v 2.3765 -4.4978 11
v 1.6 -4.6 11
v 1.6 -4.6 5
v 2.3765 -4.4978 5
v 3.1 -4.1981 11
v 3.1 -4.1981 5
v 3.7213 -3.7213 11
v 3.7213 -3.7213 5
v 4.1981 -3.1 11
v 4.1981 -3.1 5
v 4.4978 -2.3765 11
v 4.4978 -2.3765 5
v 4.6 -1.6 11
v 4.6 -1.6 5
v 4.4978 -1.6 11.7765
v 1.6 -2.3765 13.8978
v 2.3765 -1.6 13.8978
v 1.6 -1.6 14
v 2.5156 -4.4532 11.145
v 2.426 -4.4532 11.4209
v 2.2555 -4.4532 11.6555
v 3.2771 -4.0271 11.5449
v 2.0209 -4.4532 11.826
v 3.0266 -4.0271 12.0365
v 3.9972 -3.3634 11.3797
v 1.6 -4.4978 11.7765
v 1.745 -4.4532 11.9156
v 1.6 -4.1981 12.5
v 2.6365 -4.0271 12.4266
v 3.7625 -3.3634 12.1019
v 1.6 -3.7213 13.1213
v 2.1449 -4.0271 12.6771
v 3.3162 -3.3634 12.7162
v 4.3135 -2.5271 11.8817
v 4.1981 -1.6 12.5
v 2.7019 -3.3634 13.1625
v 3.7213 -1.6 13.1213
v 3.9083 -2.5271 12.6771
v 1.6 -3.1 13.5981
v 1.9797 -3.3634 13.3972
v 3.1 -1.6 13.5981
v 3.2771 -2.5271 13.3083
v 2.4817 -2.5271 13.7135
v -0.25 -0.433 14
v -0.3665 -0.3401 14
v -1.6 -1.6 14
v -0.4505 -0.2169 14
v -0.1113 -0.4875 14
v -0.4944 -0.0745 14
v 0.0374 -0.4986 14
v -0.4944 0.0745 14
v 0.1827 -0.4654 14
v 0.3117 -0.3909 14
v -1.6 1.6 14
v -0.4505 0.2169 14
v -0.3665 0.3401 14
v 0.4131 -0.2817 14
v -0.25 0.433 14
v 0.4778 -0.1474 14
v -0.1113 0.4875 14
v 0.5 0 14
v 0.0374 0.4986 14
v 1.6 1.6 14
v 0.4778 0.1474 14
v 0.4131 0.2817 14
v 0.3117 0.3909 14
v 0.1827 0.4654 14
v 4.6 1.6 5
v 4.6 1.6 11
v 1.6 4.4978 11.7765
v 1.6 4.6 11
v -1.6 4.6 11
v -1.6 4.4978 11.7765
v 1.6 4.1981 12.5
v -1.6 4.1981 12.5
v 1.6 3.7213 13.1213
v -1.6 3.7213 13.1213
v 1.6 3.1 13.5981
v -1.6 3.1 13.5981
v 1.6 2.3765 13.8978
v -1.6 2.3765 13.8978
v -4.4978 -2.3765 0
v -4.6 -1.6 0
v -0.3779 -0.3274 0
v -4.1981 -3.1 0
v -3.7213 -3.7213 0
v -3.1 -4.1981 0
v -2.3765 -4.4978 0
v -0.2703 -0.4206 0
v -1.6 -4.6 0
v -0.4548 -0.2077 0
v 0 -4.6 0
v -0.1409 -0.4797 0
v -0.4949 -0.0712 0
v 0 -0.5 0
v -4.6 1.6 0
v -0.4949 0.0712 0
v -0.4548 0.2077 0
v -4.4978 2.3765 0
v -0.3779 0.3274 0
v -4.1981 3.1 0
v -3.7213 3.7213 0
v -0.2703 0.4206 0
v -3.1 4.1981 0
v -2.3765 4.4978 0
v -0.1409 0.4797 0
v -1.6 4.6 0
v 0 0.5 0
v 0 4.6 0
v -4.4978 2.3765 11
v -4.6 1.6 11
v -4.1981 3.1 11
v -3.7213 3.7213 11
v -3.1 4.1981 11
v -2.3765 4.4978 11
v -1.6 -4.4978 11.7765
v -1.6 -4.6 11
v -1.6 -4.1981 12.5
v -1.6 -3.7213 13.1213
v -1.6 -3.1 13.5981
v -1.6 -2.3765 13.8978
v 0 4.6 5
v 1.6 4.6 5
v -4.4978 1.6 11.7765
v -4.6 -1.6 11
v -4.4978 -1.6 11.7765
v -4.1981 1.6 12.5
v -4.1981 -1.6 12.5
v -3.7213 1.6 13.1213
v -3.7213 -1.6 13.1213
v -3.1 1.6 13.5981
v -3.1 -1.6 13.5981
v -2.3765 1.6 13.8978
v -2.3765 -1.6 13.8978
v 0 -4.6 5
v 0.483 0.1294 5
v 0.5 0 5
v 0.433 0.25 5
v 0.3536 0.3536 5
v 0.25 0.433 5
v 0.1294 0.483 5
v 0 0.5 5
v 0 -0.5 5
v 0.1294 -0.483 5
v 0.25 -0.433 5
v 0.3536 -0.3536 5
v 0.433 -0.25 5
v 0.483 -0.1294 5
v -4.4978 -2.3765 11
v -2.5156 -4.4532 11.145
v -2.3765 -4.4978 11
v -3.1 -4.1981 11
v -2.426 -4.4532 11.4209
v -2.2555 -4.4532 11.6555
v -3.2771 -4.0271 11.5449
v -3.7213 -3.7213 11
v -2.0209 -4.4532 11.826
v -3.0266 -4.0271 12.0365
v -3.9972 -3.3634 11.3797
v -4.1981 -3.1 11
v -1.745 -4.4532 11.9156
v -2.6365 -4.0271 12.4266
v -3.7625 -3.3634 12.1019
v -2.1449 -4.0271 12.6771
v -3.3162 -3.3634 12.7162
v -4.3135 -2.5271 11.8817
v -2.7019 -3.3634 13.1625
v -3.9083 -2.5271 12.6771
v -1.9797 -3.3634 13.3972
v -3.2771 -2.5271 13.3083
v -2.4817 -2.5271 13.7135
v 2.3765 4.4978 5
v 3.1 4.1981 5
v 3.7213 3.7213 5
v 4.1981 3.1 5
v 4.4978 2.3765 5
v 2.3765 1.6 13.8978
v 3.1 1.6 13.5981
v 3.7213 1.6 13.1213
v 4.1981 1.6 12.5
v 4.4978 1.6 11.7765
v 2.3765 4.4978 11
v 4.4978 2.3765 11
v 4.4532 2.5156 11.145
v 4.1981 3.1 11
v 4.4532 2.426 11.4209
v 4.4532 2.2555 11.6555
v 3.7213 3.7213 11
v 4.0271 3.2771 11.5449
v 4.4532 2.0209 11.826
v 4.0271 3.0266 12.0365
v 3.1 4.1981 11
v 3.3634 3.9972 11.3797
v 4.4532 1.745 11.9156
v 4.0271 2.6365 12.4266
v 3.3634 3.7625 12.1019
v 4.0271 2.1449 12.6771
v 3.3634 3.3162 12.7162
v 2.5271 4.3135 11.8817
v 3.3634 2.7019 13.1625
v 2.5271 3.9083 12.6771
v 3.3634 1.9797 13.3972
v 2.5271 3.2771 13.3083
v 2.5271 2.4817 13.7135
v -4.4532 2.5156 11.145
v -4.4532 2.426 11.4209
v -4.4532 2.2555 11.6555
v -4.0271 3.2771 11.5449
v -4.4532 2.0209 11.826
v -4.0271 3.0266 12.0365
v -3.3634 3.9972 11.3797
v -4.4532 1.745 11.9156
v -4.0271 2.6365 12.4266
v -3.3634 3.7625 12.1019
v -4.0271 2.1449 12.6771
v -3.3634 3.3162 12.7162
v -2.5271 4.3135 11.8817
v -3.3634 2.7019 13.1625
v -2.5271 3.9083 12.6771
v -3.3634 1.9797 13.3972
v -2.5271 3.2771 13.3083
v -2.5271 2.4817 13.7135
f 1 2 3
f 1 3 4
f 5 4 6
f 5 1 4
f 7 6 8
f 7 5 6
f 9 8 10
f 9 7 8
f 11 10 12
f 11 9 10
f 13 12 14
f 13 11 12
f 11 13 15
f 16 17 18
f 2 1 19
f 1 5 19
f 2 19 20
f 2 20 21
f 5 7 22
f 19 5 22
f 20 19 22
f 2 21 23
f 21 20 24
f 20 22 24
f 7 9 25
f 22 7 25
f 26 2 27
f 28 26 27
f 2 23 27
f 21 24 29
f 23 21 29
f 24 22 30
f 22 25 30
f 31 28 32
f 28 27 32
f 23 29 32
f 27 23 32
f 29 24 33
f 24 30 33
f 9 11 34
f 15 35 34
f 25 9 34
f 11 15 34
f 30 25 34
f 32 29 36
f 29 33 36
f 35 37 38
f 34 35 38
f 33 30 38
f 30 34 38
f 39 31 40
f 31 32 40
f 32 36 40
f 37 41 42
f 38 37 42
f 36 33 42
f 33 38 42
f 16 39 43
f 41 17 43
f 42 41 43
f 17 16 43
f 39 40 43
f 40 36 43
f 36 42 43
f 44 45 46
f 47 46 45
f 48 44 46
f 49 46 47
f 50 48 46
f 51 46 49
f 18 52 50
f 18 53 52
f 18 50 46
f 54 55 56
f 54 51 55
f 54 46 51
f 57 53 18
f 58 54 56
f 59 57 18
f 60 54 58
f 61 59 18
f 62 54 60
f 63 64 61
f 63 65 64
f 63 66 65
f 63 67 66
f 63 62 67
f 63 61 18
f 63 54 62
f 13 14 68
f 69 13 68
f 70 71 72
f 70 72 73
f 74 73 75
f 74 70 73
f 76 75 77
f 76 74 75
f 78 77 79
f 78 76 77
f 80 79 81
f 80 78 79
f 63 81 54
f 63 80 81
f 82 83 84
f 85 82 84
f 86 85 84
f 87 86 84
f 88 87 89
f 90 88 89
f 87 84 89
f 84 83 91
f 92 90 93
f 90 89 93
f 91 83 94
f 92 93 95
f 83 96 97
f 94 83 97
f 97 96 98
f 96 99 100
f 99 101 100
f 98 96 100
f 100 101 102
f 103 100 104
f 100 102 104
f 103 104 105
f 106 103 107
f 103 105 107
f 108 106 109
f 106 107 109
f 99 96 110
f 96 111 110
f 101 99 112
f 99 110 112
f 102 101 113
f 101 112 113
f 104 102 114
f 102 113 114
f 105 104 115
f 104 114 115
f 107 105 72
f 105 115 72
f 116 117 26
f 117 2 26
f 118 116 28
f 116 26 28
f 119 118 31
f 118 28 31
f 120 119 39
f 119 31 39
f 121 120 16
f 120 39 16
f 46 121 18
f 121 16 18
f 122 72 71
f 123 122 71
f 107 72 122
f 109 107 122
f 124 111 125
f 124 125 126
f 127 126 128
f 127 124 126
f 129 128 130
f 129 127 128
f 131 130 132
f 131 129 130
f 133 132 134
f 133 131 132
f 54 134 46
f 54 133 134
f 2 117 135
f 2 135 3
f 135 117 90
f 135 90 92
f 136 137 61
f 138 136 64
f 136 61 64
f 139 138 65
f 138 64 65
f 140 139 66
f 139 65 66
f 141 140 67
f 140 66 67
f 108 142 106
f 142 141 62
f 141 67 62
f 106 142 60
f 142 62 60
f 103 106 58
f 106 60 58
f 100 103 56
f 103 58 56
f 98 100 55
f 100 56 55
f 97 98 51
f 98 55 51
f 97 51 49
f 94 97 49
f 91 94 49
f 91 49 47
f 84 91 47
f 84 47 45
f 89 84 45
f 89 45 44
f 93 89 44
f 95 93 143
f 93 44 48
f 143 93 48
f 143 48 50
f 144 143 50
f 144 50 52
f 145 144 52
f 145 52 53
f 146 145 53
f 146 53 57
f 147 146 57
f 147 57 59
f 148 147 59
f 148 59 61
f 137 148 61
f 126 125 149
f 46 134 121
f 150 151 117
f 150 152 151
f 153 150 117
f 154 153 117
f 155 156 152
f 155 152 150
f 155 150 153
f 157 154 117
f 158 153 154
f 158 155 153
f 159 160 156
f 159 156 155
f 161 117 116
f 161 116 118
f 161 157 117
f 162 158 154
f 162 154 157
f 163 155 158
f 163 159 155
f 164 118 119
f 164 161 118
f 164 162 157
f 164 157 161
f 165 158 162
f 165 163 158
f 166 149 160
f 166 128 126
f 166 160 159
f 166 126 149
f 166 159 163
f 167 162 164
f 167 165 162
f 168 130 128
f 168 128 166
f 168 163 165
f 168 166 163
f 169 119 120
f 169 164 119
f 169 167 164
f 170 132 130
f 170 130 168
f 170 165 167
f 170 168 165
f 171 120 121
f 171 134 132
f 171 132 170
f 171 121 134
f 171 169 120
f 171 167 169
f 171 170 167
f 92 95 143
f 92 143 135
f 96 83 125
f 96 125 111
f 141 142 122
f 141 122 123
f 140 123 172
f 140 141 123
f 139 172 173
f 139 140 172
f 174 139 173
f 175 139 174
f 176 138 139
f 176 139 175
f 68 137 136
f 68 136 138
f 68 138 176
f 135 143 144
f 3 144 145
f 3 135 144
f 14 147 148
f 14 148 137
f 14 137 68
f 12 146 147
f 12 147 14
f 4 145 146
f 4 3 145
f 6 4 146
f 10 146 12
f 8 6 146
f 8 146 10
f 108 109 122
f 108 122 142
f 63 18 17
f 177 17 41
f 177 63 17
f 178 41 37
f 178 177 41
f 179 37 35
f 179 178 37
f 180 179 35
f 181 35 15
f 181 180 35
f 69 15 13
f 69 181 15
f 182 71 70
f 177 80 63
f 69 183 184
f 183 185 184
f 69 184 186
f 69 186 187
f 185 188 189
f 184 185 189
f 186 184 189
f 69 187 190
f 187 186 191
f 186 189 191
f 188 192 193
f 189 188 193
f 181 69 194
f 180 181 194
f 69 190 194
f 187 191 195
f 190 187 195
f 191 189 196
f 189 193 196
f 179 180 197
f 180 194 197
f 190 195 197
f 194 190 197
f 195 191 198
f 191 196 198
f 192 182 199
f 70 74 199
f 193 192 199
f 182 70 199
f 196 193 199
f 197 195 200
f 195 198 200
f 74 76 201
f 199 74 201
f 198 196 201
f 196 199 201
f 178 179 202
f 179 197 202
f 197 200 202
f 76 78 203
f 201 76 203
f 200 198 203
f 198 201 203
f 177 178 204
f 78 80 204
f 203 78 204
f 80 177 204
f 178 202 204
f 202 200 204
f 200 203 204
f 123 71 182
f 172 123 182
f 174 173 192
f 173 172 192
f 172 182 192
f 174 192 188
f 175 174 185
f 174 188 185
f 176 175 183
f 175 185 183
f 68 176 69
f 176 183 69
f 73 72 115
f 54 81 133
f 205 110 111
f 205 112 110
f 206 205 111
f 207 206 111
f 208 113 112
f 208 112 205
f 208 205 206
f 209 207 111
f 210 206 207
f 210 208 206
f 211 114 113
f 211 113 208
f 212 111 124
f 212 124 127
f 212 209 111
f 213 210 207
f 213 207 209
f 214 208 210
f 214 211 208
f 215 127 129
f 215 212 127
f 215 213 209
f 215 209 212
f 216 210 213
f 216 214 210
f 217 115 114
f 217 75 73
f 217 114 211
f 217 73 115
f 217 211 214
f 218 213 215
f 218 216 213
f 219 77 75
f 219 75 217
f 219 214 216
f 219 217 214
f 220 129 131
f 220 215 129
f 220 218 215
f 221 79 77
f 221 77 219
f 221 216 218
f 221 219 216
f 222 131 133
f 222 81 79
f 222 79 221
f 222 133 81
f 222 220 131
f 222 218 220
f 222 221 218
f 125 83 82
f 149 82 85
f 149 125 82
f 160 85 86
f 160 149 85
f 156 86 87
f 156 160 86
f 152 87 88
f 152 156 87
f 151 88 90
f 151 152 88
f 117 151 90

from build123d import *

# Parameters (mm, degrees)
SKETCH_W        = 9.2
SKETCH_H        = 9.2
PAD_DEPTH       = 14
SKETCH001_R     = 0.5
POCKET_DEPTH    = 14.001
FILLET_R        = 3
SKETCH002_W     = 5.20137
SKETCH002_H     = 9.517286
POCKET001_DEPTH = 5


with BuildPart() as part:
    # Sketch → Pad (new body)
    with BuildSketch(Plane.XY):
        Rectangle(SKETCH_W, SKETCH_H)
    extrude(amount=PAD_DEPTH)

    # Sketch001 (on Face6 of Pad) → Pocket (cut, through all)
    with BuildSketch(Plane.XY.offset(14)):
        Circle(SKETCH001_R)
    extrude(amount=-POCKET_DEPTH, mode=Mode.SUBTRACT)

    # Fillet
    fillet_edges = [part.edges().sort_by_distance(p)[0] for p in [
        (0, 4.6, 14),
        (4.6, 4.6, 7),
        (4.6, 0, 14),
        (-4.6, 4.6, 7),
        (-4.6, 0, 14),
        (4.6, -4.6, 7),
        (-4.6, -4.6, 7),
        (0, -4.6, 14),
    ]]
    fillet(fillet_edges, radius=FILLET_R)

    # Sketch002 (on Face2 of Fillet) → Pocket001 (cut)
    with BuildSketch(Plane(origin=(0, 0, 0), x_dir=(1, 0, 0), z_dir=(0, 0, -1))):
        with Locations((2.600685, 0.034579)):
            Rectangle(SKETCH002_W, SKETCH002_H)
    extrude(amount=-POCKET001_DEPTH, mode=Mode.SUBTRACT)


solid = part.part
